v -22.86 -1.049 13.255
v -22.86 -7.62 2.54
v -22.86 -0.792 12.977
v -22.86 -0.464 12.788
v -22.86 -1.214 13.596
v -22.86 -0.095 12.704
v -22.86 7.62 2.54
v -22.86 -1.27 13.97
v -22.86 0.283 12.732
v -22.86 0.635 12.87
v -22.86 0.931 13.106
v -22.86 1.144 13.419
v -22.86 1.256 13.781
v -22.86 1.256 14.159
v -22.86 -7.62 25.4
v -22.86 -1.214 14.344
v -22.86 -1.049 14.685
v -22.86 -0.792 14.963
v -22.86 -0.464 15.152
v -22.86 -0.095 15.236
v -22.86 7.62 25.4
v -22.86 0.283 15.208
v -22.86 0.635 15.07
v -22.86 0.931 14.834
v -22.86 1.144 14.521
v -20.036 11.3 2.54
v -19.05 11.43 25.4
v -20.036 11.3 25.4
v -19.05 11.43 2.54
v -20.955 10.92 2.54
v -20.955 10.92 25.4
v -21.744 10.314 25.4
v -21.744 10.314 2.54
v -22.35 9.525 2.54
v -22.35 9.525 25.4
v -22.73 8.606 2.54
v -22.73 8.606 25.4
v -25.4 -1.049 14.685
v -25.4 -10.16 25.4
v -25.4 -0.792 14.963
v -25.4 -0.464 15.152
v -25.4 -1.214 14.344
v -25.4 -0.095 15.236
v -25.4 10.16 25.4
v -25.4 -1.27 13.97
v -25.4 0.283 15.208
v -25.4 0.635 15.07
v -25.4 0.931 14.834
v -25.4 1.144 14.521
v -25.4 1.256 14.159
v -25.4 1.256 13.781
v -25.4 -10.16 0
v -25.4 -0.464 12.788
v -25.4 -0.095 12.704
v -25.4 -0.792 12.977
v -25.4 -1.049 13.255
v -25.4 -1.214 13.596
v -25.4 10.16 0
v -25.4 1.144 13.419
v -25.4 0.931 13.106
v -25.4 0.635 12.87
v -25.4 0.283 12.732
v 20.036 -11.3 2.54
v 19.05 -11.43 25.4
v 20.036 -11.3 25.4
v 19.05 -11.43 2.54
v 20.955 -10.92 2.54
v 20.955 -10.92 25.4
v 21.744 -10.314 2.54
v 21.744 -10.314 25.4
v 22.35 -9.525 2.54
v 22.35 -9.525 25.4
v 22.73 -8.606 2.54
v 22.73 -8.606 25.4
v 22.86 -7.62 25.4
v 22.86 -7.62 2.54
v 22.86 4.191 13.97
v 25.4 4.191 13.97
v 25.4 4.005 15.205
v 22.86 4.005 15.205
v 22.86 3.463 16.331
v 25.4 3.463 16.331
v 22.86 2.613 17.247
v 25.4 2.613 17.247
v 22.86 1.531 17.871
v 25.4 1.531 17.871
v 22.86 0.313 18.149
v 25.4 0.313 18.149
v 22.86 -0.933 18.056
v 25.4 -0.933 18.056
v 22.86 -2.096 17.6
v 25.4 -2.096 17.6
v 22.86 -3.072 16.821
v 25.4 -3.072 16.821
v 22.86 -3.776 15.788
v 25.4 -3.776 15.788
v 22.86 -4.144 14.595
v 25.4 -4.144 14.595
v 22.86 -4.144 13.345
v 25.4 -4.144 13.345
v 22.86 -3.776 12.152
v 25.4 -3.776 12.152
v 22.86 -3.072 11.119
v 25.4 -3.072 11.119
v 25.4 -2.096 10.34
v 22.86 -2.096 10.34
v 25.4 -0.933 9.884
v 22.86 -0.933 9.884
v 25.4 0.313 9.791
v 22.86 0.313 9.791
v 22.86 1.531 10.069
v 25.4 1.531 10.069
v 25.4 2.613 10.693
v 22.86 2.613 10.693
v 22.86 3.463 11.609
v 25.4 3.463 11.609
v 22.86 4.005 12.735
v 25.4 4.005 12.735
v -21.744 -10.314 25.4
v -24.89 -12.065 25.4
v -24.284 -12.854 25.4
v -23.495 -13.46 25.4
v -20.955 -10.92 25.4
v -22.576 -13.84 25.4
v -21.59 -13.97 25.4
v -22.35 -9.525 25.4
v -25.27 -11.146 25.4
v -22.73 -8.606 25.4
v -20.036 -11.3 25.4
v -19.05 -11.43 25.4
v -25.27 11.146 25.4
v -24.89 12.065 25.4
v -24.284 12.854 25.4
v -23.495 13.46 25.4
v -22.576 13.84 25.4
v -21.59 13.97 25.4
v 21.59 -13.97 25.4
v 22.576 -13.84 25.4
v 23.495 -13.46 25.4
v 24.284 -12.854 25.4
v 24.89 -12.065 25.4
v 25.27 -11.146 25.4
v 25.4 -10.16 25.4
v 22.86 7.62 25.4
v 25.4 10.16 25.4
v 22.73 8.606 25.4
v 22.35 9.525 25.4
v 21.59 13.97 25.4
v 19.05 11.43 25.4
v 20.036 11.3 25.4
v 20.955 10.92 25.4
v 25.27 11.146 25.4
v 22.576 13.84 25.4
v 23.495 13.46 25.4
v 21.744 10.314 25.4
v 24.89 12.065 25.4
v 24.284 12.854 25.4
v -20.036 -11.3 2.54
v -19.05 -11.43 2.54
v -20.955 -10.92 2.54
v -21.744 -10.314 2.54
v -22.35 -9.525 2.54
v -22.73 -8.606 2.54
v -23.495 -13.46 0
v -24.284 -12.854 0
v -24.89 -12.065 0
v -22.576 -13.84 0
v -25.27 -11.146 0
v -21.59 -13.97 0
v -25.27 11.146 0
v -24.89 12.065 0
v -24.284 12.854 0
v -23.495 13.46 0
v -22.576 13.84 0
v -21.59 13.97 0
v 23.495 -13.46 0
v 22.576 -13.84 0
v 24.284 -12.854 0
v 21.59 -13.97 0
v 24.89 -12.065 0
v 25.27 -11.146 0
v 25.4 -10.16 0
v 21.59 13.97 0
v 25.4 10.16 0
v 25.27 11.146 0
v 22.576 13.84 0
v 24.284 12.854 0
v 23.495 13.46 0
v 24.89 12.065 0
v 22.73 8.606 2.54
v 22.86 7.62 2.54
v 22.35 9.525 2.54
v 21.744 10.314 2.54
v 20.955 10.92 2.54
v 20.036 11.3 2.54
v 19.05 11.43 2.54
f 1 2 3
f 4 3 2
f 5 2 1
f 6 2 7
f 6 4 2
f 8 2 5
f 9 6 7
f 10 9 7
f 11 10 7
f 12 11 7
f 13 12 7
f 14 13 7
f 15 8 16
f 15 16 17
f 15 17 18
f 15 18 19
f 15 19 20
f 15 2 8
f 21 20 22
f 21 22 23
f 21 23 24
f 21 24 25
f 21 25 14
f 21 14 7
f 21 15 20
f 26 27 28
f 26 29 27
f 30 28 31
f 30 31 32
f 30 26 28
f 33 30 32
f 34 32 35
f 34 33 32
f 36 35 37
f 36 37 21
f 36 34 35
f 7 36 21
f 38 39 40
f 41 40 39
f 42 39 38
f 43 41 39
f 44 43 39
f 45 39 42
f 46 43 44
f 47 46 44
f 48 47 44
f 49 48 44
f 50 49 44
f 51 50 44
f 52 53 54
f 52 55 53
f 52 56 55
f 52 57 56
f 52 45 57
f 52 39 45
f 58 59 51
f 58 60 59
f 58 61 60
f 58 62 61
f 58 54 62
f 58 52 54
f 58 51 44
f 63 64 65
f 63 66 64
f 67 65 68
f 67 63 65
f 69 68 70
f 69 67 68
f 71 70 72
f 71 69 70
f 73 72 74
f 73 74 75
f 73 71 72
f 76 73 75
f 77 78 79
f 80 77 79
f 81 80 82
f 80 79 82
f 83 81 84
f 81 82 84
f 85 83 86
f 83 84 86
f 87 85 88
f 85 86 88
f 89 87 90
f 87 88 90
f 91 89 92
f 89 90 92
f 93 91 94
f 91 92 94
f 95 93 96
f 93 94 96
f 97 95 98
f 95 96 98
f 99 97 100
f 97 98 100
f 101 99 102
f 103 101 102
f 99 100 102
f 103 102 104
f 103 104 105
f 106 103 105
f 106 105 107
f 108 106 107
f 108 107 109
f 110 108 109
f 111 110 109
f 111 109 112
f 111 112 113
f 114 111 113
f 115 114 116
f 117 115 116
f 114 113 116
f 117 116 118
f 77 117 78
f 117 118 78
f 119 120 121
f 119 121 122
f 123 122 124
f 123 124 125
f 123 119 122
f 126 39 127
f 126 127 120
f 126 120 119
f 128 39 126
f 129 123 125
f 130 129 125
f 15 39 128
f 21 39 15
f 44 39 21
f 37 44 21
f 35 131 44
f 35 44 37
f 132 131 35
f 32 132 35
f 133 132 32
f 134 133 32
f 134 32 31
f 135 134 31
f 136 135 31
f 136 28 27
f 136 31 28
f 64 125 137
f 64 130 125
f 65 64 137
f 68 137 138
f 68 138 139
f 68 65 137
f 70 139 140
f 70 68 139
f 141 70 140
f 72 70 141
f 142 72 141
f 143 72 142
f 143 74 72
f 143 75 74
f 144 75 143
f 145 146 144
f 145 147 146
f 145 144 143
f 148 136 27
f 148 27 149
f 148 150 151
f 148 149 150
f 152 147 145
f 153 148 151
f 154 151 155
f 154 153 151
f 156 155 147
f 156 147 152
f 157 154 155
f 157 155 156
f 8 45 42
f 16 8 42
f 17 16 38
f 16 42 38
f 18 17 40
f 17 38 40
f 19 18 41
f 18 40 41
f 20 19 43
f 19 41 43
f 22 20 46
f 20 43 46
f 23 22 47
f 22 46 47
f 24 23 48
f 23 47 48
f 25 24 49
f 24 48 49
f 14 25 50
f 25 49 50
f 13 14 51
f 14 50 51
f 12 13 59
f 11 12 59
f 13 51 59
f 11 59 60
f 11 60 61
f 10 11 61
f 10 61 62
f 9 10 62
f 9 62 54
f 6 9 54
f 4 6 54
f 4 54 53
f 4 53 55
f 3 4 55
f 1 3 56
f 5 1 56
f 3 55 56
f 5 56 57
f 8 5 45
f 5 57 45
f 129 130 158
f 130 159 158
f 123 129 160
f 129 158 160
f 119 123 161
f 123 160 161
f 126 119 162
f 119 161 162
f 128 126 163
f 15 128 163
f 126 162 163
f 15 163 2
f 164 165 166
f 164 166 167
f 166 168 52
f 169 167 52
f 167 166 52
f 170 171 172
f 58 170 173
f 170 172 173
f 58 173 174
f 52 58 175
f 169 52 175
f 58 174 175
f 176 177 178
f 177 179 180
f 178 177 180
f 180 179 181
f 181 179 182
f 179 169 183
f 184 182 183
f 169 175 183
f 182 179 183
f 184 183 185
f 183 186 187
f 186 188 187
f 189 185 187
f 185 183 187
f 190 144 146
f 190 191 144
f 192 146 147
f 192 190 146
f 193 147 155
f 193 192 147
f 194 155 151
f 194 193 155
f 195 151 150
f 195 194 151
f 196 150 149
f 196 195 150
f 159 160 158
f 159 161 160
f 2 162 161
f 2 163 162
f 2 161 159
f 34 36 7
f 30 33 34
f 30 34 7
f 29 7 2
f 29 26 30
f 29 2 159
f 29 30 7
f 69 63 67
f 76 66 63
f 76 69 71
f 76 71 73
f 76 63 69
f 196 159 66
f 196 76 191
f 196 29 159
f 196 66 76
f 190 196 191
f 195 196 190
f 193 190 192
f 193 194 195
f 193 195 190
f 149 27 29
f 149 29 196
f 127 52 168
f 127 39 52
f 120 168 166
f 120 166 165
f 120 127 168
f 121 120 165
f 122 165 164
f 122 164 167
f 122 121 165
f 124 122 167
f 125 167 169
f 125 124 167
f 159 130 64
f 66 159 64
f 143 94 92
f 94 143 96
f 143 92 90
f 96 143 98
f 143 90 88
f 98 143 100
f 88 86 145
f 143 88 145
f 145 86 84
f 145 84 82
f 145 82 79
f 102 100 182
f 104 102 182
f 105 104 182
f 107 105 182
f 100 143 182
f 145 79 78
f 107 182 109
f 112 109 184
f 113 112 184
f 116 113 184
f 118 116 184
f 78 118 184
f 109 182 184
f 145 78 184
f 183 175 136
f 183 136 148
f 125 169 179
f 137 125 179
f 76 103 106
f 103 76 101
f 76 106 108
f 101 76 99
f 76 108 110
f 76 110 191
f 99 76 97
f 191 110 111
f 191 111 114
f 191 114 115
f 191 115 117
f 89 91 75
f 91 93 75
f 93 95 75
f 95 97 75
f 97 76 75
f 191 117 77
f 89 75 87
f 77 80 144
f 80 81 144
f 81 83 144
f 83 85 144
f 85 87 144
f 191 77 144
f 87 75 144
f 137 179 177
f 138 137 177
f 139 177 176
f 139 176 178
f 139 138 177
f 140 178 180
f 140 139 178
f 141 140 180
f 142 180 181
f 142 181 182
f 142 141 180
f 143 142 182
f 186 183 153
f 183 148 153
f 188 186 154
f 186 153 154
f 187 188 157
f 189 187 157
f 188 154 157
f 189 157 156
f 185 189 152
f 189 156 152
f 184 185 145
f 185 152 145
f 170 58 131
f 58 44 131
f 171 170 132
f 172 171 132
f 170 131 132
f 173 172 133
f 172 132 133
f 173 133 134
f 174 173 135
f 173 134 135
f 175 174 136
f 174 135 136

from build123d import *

# Parameters (mm, degrees)
F0_W     = 50.8
F0_H     = 27.94
F1_DEPTH = 25.4
F2_W     = 45.72
F2_H     = 22.86
F3_DEPTH = 22.86
F4_R     = 3.81
F5_R     = 4.191
F6_DEPTH = 2.54
F7_R     = 1.27
F8_DEPTH = 2.54


with BuildPart() as f1:
    # F0 (on Top) → F1 (new body)
    with BuildSketch(Plane.XY):
        Rectangle(F0_W, F0_H)
    extrude(amount=F1_DEPTH)

    # F2 (on face) → F3 (cut)
    with BuildSketch(Plane.XY.offset(25.4)):
        Rectangle(F2_W, F2_H)
    extrude(amount=-F3_DEPTH, mode=Mode.SUBTRACT)

    # F4
    f4_edges = [f1.edges().sort_by_distance(p)[0] for p in [
        (-25.4, -13.97, 12.7),
        (25.4, -13.97, 12.7),
        (25.4, 13.97, 12.7),
        (-25.4, 13.97, 12.7),
        (-22.86, -11.43, 13.97),
        (-22.86, 11.43, 13.97),
        (22.86, 11.43, 13.97),
        (22.86, -11.43, 13.97),
    ]]
    fillet(f4_edges, radius=F4_R)

    # F5 (on face) → F6 (cut, through all)
    with BuildSketch(Plane.YZ.offset(25.4)):
        with Locations((0, 13.97)):
            Circle(F5_R)
    extrude(amount=-F6_DEPTH, mode=Mode.SUBTRACT)

    # F7 (on face) → F8 (cut, through all)
    with BuildSketch(Plane(origin=(-25.4, 0, 0), x_dir=(0, -1, 0), z_dir=(-1, 0, 0))):
        with Locations((0, 13.97)):
            Circle(F7_R)
    extrude(amount=-F8_DEPTH, mode=Mode.SUBTRACT)


solid = f1.part
